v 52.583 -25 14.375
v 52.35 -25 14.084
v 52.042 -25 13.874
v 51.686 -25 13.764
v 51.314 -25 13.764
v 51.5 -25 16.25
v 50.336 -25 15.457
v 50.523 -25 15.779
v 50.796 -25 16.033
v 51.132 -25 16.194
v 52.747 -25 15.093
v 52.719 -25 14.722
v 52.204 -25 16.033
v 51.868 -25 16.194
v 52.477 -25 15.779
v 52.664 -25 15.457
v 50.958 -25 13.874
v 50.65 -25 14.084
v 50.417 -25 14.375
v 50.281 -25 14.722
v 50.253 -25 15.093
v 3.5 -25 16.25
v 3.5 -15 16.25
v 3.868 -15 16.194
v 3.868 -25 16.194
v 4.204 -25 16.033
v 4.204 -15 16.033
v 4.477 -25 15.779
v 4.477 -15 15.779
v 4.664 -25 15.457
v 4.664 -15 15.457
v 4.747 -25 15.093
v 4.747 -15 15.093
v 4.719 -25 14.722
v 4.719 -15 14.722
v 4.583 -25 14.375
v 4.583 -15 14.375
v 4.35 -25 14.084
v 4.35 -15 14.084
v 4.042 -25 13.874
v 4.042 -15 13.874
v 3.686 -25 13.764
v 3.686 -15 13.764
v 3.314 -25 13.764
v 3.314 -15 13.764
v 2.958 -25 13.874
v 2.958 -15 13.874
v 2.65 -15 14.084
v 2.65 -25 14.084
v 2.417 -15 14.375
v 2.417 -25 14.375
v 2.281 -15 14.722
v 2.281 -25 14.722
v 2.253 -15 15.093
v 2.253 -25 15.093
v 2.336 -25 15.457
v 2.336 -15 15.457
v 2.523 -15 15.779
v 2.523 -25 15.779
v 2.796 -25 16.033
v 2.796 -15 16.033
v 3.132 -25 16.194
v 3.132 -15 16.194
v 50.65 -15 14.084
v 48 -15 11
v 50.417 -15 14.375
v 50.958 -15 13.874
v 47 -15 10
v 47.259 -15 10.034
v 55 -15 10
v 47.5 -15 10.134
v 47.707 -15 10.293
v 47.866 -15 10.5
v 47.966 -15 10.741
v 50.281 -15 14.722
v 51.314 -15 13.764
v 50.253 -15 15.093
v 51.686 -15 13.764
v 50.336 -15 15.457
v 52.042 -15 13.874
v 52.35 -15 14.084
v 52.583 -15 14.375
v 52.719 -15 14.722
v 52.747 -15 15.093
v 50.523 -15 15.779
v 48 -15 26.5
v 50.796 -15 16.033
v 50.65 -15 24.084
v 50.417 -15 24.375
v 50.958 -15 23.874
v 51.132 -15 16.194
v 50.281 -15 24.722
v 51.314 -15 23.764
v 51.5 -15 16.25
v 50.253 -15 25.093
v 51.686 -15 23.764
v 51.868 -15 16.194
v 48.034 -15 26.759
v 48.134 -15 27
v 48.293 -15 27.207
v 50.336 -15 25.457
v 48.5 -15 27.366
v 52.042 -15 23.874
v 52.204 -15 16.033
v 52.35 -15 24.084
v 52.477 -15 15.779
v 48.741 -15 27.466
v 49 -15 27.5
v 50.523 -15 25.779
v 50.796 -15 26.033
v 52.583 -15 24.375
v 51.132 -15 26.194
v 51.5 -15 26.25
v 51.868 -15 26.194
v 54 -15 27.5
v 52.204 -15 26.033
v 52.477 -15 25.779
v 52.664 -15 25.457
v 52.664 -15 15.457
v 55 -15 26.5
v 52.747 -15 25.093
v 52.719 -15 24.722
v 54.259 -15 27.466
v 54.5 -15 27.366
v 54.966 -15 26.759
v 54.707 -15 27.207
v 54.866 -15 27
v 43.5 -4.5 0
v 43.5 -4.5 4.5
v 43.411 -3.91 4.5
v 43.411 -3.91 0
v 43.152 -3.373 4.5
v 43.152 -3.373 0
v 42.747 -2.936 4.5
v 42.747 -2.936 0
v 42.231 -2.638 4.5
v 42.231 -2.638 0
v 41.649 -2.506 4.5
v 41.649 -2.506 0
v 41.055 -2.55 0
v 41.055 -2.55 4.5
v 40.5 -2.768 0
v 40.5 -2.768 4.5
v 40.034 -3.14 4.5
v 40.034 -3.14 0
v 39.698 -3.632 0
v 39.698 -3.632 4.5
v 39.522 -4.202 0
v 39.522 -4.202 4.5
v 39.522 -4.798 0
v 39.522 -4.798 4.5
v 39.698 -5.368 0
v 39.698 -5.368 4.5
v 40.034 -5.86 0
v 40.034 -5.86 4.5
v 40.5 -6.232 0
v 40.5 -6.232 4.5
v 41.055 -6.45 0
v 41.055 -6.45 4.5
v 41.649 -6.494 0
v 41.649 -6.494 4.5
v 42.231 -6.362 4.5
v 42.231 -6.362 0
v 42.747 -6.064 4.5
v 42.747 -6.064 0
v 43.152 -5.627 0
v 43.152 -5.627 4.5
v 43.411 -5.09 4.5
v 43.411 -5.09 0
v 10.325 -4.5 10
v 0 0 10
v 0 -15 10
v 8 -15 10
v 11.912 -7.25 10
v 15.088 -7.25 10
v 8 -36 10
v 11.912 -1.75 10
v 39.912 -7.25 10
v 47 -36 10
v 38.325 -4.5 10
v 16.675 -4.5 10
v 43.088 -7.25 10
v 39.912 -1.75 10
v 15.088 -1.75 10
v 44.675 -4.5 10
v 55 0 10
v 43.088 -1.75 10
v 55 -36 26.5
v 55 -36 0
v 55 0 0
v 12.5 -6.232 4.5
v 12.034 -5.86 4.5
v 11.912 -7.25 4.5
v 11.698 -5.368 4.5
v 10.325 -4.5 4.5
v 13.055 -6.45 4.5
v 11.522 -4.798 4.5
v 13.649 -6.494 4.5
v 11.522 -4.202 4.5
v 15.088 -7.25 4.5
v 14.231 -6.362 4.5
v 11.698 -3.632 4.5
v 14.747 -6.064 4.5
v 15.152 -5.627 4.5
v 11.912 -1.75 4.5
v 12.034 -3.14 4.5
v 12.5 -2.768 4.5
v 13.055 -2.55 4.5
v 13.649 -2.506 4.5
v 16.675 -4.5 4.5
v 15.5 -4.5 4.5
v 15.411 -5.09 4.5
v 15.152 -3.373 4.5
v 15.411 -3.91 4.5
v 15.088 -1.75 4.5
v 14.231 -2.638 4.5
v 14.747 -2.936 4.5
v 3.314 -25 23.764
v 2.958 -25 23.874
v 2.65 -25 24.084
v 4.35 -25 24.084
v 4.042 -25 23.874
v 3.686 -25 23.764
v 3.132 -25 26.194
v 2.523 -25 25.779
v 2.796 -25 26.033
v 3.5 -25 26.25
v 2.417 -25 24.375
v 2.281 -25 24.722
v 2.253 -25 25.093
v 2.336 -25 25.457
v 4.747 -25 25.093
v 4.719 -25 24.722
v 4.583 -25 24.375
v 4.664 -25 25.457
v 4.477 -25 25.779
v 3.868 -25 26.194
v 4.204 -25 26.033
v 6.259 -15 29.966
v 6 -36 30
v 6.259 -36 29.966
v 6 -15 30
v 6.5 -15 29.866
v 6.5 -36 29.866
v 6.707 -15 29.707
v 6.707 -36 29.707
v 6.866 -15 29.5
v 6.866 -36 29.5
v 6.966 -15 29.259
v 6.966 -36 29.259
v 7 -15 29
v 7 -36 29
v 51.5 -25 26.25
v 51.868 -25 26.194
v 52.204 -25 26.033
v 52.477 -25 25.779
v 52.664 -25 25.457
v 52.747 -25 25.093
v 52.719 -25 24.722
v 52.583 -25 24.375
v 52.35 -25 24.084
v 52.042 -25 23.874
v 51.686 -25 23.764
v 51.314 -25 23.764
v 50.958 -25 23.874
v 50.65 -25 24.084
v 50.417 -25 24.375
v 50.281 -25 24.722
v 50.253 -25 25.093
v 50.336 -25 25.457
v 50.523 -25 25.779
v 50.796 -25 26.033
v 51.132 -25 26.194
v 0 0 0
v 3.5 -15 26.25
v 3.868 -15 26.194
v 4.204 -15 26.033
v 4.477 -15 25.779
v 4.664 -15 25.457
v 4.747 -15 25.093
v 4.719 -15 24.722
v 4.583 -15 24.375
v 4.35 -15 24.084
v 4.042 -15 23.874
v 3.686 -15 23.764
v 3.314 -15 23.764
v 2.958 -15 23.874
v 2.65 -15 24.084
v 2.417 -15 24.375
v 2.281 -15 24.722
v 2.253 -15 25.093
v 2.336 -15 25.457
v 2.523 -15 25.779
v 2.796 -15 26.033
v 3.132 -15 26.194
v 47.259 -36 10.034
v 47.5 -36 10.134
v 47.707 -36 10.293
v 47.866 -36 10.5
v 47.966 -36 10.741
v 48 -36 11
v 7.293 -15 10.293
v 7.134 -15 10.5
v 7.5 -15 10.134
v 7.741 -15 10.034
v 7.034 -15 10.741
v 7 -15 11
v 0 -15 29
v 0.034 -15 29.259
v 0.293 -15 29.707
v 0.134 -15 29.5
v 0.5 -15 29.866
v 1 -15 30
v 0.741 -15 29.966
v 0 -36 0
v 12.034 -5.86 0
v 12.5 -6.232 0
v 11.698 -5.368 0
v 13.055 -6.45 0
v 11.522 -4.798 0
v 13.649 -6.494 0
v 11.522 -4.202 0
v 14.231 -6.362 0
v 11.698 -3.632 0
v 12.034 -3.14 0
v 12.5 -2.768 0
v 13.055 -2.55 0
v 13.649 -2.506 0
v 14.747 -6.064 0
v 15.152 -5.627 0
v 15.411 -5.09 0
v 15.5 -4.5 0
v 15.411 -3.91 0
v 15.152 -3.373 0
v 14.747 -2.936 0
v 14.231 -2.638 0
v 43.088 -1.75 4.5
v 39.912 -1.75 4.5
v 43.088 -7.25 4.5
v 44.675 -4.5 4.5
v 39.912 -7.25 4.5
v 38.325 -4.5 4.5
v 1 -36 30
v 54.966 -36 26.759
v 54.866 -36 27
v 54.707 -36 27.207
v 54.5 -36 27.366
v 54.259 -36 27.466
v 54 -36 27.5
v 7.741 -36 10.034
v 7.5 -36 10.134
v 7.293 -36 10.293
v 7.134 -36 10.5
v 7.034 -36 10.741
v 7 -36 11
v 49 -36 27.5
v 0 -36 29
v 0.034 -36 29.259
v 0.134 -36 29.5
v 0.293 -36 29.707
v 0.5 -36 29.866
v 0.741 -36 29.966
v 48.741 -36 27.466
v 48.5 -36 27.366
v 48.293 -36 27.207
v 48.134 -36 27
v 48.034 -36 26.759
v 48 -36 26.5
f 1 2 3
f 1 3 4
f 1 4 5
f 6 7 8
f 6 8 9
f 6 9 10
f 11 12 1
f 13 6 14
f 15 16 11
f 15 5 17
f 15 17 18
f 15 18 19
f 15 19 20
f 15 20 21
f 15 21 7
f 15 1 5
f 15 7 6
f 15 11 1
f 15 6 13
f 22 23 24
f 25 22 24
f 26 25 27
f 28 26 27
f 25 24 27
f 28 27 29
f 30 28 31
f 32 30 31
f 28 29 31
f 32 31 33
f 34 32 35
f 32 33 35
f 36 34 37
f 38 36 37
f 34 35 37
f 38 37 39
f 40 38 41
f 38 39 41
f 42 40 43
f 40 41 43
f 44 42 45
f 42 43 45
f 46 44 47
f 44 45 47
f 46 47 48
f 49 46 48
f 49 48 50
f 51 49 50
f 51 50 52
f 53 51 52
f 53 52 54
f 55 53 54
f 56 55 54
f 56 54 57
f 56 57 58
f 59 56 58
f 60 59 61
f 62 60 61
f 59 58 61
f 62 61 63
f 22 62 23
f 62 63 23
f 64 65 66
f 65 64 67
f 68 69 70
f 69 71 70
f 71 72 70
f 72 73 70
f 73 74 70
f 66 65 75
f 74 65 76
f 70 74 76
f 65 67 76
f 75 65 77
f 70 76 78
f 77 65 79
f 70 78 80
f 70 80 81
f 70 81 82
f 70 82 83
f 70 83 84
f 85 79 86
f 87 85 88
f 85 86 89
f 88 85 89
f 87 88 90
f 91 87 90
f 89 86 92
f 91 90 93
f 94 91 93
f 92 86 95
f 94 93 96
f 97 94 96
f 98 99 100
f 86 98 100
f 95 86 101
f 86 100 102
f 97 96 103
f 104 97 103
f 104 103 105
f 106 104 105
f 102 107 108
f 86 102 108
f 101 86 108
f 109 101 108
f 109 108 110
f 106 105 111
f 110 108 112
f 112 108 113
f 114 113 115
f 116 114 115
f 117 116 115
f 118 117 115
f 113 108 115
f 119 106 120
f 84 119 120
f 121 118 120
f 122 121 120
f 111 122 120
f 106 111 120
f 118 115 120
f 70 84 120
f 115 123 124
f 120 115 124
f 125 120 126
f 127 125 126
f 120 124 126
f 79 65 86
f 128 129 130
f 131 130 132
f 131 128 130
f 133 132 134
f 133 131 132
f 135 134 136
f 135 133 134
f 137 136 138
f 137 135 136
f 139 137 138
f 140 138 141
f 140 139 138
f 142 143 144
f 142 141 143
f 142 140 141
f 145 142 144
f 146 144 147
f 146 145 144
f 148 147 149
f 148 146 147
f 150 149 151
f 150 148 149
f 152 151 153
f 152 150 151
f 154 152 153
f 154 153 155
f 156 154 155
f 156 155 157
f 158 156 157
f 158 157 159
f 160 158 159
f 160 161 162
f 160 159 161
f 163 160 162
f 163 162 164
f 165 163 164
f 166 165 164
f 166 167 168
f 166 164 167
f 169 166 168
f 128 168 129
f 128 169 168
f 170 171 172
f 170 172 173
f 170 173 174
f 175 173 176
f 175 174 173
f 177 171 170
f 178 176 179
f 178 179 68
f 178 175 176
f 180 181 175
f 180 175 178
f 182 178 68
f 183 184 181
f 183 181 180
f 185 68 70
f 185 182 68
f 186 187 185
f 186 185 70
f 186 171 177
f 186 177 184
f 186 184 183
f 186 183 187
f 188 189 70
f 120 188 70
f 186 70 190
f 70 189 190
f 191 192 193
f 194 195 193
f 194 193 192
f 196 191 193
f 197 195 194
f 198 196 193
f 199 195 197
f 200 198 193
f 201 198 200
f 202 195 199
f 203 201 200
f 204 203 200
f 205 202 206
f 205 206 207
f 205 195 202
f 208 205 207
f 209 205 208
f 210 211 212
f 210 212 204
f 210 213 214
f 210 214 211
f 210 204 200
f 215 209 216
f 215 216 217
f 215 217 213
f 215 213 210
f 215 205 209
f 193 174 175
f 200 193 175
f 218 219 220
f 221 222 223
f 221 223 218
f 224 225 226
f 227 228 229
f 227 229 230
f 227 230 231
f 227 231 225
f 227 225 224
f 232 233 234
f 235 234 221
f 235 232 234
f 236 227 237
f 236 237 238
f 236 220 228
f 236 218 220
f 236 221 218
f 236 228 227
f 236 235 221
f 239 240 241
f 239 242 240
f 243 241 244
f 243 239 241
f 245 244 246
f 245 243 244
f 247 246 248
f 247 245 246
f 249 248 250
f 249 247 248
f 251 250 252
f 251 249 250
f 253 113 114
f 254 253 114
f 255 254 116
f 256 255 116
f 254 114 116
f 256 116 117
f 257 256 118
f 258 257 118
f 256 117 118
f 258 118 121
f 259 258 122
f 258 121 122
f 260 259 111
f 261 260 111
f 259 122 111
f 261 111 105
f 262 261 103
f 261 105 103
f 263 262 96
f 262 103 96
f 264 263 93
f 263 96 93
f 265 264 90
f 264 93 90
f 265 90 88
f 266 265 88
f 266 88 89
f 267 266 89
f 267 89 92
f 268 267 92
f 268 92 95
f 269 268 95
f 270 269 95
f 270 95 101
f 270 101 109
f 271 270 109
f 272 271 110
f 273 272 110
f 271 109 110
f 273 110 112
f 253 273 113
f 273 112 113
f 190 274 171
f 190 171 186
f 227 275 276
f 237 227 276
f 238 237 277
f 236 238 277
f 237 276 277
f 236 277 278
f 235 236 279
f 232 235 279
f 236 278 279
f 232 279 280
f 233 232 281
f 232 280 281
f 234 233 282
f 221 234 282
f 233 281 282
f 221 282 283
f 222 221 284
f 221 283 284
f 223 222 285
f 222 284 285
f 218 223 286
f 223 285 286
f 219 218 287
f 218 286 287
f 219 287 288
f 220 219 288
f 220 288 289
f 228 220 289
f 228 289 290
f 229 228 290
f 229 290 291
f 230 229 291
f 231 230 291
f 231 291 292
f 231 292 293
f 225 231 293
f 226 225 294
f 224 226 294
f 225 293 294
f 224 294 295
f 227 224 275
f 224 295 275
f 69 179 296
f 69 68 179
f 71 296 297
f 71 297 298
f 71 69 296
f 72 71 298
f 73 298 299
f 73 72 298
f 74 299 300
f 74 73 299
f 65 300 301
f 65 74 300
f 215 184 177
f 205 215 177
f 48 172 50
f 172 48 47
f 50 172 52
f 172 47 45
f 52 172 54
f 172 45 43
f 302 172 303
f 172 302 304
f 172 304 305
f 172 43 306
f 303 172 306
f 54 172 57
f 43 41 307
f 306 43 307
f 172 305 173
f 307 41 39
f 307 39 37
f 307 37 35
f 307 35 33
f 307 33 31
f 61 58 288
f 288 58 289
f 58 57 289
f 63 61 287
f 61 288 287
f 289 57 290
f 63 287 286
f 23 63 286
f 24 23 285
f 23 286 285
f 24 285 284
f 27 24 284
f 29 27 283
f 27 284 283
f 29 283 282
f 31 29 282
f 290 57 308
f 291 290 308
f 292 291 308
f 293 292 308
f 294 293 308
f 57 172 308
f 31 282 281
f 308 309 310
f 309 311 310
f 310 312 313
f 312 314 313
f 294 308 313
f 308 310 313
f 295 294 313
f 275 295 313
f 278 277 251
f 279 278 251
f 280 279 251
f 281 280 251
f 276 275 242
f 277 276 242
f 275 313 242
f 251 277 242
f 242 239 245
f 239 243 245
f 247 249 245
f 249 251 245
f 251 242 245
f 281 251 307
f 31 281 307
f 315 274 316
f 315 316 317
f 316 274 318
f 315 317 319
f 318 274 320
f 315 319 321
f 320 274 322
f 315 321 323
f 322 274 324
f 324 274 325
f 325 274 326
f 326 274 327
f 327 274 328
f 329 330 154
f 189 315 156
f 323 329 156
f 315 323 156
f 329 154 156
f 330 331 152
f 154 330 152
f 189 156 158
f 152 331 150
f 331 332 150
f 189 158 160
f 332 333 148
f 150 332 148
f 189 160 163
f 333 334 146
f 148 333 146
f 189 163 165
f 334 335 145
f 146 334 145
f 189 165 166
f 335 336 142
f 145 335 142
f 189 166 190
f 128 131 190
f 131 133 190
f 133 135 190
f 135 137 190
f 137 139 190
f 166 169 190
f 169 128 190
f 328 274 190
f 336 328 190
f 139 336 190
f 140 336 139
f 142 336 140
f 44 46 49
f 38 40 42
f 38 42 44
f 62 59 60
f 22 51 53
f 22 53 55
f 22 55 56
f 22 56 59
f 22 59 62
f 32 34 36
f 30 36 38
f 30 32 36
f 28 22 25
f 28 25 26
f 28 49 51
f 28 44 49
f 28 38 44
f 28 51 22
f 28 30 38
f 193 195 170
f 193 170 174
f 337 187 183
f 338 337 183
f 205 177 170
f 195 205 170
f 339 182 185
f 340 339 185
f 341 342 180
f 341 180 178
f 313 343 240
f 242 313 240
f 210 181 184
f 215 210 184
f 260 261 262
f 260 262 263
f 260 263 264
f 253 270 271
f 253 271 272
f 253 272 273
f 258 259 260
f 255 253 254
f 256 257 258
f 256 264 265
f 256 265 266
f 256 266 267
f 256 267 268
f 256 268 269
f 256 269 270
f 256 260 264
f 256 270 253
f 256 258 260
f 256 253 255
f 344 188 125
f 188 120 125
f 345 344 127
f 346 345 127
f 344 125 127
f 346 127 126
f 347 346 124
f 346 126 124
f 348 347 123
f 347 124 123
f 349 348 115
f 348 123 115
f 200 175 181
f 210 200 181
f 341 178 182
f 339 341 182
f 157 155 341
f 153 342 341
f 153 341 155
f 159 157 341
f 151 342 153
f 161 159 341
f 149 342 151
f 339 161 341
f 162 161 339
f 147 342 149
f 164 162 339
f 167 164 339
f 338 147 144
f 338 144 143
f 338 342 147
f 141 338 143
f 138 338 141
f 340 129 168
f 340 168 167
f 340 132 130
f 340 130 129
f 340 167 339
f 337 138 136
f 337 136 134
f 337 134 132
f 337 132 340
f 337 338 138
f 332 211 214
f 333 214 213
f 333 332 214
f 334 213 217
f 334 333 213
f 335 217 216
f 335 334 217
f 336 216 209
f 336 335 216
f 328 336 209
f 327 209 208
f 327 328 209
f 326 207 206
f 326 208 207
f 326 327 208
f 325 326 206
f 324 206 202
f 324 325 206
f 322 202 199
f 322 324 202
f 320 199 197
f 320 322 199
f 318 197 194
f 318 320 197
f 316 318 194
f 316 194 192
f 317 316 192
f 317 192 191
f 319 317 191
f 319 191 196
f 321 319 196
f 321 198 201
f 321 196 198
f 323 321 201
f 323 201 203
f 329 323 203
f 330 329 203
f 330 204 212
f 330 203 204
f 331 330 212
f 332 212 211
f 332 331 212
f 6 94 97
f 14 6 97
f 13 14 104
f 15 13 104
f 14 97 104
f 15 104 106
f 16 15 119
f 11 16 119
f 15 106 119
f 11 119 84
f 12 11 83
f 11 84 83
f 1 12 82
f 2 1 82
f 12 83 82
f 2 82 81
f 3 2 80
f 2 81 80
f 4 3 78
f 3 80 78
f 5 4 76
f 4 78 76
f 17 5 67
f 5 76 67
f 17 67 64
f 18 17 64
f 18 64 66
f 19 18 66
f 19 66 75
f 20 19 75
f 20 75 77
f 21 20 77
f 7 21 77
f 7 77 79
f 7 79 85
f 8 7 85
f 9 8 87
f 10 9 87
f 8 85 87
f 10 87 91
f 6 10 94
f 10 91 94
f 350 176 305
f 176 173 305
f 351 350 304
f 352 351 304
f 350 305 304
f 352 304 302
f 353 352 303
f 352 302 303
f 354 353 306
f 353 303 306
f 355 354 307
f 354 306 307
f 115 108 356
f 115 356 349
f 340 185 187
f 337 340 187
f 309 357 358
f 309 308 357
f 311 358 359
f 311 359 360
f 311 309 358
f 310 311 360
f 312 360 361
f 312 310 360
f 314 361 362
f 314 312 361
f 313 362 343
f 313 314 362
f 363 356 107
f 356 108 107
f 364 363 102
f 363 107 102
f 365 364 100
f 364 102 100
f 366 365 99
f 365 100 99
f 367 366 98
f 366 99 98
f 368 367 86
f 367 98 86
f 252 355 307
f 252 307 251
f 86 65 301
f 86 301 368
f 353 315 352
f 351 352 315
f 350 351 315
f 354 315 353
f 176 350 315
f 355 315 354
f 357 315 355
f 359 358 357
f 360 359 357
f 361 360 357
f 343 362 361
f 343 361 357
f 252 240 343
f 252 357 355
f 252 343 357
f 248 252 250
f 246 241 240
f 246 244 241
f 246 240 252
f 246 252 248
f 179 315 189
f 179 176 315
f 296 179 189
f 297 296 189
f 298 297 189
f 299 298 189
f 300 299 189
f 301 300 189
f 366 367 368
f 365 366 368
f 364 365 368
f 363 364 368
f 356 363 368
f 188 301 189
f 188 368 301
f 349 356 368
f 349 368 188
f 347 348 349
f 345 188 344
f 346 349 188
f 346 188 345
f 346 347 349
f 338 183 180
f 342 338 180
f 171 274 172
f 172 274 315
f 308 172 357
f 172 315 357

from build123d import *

# Parameters (mm, degrees)
SKETCH1_W           = 55
SKETCH1_H           = 36
SKETCH1_R           = 2
BOSS_EXTRUDE1_DEPTH = 10
SKETCH2_W           = 7
SKETCH2_H           = 20
SKETCH2_H_2         = 17.5
BOSS_EXTRUDE2_DEPTH = 21
SKETCH3_R           = 1.25
CUT_EXTRUDE1_DEPTH  = 10
CUT_EXTRUDE2_DEPTH  = 5.5
LPATTERN1_COUNT     = 2
LPATTERN1_PITCH     = 28
FILLET1_R           = 1


with BuildPart() as part:
    # Sketch1 → Boss-Extrude1 (new body)
    with BuildSketch(Plane.XY):
        with Locations((27.5, -18)):
            Rectangle(SKETCH1_W, SKETCH1_H)
        with Locations((13.5, -4.5)):
            Circle(SKETCH1_R, mode=Mode.SUBTRACT)
        with Locations((41.5, -4.5)):
            Circle(SKETCH1_R, mode=Mode.SUBTRACT)
    extrude(amount=BOSS_EXTRUDE1_DEPTH)

    # Sketch2 → Boss-Extrude2 (add)
    with BuildSketch(Plane.XZ.offset(36)):
        with Locations((3.5, 20)):
            Rectangle(SKETCH2_W, SKETCH2_H)
        with Locations((51.5, 18.75)):
            Rectangle(SKETCH2_W, SKETCH2_H_2)
    extrude(amount=-BOSS_EXTRUDE2_DEPTH)

    # Sketch3 → Cut-Extrude1 (cut)
    with BuildSketch(Plane(origin=(0, -15, 0), x_dir=(1, 0, 0), z_dir=(0, 1, 0))):
        with Locations(Location((3.5, -15, 0), (0, 0, 270))):
            Circle(SKETCH3_R)
        with Locations(Location((51.5, -15, 0), (0, 0, 270))):
            Circle(SKETCH3_R)
        with Locations(Location((51.5, -25, 0), (0, 0, 270))):
            Circle(SKETCH3_R)
        with Locations(Location((3.5, -25, 0), (0, 0, 270))):
            Circle(SKETCH3_R)
    extrude(amount=-CUT_EXTRUDE1_DEPTH, mode=Mode.SUBTRACT)

    # Sketch4 → Cut-Extrude2 (cut)
    with BuildSketch(Plane.XY.offset(10)):
        Polygon((11.91228676, -1.75), (10.324573519, -4.5), (11.91228676, -7.25), (15.08771324, -7.25), (16.675426481, -4.5), (15.08771324, -1.75), align=None)
    cut_extrude2 = extrude(amount=-CUT_EXTRUDE2_DEPTH, mode=Mode.SUBTRACT)

    # LPattern1: Cut-Extrude2 ×2
    with Locations(*[(i * LPATTERN1_PITCH, 0, 0) for i in range(1, LPATTERN1_COUNT)]):
        add(cut_extrude2, mode=Mode.SUBTRACT)

    # Fillet1
    fillet1_edges = [part.edges().sort_by_distance(p)[0] for p in [
        (0, -25.5, 30),
        (7, -25.5, 30),
        (7, -25.5, 10),
        (55, -25.5, 27.5),
        (48, -25.5, 10),
        (48, -25.5, 27.5),
    ]]
    fillet(fillet1_edges, radius=FILLET1_R)


solid = part.part
